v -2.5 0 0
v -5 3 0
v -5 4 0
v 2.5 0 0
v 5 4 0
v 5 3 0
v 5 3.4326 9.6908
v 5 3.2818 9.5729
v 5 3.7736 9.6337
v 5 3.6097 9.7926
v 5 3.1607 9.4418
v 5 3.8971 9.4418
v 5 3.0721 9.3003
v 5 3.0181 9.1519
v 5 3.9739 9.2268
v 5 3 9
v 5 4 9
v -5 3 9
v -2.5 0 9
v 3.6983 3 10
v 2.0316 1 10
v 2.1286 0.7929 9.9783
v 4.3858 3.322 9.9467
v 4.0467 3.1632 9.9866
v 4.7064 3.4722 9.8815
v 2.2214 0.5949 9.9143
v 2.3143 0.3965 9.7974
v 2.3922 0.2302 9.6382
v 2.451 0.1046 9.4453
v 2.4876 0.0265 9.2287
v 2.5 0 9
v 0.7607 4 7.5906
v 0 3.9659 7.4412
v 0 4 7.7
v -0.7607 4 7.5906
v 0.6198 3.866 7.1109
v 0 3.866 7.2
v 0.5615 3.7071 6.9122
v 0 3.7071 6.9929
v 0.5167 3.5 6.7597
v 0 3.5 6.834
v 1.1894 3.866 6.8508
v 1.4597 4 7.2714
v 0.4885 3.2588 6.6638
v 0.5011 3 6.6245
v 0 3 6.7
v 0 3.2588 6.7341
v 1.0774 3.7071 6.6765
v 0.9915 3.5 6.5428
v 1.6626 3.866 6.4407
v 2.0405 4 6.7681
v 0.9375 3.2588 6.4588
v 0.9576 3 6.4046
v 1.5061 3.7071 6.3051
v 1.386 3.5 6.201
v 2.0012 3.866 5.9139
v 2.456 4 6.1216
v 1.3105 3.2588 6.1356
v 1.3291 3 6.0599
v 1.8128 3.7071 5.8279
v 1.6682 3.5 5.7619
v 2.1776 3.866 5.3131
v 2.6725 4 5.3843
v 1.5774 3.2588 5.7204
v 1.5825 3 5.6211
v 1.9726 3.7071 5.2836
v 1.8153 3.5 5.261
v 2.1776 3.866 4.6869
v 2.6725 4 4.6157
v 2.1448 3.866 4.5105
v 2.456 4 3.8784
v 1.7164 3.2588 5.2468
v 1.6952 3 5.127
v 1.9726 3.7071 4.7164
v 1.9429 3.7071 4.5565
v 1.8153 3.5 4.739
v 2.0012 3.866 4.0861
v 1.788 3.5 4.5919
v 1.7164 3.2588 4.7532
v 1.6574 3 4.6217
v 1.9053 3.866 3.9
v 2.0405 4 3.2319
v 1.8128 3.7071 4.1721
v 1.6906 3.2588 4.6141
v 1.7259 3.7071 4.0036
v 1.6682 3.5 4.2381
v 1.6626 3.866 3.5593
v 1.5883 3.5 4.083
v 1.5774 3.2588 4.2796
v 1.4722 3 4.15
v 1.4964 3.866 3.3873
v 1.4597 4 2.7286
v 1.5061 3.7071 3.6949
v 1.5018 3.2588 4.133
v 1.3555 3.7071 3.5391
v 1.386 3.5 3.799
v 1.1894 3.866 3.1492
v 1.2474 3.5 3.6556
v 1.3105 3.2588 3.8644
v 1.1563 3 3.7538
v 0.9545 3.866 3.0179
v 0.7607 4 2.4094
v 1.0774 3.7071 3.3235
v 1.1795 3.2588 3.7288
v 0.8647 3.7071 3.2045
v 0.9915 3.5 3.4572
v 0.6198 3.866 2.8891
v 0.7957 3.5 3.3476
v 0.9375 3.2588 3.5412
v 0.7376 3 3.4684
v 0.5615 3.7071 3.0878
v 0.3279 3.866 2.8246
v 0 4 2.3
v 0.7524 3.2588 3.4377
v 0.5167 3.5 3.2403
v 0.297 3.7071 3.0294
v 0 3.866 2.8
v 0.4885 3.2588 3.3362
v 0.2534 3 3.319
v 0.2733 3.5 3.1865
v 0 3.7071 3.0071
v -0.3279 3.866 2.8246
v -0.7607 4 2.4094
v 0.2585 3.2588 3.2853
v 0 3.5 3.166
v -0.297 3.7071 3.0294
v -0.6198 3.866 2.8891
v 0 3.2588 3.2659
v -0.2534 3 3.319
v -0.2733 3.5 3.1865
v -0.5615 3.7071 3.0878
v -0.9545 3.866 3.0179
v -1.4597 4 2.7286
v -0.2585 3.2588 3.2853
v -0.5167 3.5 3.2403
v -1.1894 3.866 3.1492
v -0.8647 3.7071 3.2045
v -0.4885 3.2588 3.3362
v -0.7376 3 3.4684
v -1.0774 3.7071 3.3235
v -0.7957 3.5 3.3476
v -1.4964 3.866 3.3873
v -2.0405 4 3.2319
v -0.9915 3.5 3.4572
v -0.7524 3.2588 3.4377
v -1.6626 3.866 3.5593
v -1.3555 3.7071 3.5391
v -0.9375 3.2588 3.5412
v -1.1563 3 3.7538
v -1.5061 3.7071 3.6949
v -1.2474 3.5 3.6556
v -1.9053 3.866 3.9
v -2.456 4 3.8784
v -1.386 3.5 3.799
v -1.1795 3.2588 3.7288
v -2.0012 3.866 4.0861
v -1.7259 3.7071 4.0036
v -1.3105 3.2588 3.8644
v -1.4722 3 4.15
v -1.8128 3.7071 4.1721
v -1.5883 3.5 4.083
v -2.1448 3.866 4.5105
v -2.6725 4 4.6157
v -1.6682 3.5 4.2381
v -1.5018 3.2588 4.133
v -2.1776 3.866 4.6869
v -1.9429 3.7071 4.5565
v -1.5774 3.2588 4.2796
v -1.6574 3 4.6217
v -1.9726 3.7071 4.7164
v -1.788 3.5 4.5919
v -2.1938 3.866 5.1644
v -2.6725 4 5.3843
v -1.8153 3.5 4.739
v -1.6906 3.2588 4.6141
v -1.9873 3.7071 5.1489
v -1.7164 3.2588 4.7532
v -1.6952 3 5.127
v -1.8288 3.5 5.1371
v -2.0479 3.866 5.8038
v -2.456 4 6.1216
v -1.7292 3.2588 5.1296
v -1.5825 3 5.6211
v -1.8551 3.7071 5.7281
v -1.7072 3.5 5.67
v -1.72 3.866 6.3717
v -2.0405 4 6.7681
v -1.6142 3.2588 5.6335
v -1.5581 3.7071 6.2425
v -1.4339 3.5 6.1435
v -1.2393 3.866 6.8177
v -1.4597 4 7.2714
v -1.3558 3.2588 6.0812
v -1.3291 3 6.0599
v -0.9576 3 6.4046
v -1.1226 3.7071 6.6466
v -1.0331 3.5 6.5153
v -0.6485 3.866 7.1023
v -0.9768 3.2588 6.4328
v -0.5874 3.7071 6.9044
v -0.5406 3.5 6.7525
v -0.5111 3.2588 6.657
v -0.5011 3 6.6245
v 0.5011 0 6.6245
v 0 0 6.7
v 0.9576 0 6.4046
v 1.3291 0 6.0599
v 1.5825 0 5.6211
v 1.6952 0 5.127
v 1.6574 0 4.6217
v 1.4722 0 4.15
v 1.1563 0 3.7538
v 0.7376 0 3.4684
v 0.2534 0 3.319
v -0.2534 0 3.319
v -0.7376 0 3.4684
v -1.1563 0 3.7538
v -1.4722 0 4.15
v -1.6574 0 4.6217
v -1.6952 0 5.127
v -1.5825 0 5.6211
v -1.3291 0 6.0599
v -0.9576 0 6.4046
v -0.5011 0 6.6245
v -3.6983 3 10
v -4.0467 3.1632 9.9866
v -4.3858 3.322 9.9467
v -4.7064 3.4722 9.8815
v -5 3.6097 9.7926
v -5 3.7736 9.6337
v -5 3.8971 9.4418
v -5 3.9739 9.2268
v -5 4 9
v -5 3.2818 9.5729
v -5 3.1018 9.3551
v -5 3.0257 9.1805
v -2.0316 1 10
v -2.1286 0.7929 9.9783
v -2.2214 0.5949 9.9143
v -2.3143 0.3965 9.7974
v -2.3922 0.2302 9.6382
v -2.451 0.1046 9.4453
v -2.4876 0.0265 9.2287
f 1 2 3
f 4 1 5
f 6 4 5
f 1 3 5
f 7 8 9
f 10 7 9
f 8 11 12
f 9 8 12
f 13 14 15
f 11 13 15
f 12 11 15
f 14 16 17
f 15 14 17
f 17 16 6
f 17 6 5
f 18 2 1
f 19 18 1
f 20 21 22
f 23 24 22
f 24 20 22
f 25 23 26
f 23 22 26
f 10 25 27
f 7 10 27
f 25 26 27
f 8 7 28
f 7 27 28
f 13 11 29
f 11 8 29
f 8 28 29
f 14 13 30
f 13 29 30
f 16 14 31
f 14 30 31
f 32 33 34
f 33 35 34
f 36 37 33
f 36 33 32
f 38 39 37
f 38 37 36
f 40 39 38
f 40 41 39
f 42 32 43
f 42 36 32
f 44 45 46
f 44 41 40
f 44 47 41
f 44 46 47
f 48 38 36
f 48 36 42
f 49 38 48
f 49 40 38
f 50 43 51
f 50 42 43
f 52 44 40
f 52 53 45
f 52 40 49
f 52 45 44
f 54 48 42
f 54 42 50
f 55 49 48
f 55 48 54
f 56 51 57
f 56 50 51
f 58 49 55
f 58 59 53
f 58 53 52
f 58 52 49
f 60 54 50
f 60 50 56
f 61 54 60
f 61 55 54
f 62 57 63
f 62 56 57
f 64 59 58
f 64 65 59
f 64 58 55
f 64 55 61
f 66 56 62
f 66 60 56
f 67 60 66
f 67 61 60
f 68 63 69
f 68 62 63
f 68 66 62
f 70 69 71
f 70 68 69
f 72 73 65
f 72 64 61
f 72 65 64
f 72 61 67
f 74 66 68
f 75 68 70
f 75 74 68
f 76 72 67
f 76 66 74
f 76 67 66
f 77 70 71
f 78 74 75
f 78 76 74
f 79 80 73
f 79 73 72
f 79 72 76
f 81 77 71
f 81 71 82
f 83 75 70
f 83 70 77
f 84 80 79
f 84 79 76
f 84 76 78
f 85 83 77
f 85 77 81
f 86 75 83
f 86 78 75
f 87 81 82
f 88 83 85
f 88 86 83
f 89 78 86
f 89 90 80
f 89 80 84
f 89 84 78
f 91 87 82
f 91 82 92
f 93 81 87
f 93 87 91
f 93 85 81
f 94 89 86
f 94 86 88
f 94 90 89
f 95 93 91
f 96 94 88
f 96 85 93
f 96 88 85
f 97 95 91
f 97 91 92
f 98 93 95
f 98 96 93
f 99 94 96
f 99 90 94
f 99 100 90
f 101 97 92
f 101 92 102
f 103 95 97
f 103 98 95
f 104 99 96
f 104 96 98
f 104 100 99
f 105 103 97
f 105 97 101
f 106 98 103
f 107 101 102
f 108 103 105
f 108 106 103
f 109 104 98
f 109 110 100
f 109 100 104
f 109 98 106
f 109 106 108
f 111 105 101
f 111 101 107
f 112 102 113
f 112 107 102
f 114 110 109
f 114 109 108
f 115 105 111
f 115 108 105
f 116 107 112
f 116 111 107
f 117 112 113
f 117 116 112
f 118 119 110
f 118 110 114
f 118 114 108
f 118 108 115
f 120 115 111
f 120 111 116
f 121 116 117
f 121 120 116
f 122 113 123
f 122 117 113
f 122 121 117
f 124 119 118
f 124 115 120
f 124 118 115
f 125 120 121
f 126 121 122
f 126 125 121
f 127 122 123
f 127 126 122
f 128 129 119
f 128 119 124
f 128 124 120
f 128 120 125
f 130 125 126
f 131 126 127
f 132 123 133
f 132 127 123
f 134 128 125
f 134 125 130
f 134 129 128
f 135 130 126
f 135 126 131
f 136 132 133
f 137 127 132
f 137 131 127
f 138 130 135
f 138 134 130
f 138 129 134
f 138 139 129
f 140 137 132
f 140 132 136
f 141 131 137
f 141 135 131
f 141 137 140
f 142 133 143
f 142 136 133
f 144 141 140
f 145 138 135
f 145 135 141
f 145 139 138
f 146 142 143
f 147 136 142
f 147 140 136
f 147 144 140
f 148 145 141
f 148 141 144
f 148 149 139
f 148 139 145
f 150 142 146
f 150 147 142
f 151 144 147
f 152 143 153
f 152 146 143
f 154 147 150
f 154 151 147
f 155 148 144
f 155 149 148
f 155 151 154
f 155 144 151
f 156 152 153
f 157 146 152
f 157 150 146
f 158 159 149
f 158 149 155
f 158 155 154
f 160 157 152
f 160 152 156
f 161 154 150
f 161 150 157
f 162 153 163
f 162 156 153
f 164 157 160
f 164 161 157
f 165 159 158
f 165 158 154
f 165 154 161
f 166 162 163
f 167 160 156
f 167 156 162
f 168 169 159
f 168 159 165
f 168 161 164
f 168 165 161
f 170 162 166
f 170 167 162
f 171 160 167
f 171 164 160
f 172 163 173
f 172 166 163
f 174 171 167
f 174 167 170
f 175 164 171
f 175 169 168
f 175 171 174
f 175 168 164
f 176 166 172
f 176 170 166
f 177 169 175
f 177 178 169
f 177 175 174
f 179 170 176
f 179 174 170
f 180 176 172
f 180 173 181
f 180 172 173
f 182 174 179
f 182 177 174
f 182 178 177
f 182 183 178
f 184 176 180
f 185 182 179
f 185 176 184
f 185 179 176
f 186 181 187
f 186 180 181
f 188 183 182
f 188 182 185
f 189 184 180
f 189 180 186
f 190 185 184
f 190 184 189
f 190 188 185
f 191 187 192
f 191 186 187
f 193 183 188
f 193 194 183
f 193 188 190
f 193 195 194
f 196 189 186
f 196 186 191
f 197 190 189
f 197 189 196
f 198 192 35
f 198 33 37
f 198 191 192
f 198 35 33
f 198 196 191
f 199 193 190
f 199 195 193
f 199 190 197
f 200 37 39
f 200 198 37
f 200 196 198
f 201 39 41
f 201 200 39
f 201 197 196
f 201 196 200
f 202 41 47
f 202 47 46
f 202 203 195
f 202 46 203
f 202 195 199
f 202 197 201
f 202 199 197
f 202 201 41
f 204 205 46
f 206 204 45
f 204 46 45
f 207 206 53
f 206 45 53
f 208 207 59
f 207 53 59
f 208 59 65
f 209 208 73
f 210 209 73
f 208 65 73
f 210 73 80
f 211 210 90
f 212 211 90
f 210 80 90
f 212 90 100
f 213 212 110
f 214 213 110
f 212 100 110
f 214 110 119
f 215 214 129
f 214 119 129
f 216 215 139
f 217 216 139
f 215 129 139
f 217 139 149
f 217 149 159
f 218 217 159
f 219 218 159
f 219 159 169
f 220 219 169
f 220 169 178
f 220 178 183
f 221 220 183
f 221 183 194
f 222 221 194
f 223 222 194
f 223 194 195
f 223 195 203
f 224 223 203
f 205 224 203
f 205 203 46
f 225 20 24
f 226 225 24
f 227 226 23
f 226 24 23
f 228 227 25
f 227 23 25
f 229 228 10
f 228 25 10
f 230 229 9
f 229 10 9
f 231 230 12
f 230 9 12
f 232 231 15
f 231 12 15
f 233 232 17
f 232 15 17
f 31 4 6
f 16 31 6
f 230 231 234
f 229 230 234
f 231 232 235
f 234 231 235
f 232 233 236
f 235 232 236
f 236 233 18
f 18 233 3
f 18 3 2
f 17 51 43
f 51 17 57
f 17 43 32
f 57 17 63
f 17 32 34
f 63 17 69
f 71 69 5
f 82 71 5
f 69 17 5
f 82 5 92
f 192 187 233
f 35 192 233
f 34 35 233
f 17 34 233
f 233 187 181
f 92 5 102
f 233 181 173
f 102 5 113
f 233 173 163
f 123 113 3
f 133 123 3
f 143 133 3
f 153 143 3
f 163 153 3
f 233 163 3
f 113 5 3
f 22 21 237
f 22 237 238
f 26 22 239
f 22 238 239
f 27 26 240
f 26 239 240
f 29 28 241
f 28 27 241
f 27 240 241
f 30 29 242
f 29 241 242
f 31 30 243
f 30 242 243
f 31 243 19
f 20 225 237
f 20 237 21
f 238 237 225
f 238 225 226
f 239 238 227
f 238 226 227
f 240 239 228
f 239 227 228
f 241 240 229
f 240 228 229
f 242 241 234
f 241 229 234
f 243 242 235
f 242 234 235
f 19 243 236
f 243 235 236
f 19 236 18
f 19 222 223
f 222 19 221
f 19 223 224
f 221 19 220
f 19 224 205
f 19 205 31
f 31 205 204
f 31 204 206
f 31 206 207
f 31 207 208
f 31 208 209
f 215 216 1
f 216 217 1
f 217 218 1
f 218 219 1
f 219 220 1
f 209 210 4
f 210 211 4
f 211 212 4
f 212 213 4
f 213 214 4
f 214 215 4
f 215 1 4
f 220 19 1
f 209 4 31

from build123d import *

# Parameters (mm, degrees)
BOSS_EXTRUDE1_DEPTH = 10
SKETCH3_R           = 1.7
CUT_EXTRUDE1_DEPTH  = 12.874342087
FILLET2_R           = 1


with BuildPart() as part:
    # Sketch1 → Boss-Extrude1 (new body)
    with BuildSketch(Plane.XY):
        Polygon((-2.5, 0), (2.5, 0), (5, 3), (5, 4), (-5, 4), (-5, 3), align=None)
    extrude(amount=BOSS_EXTRUDE1_DEPTH)

    # Sketch3 → Cut-Extrude1 (cut, through all)
    with BuildSketch(Plane(origin=(0, 4, 0), x_dir=(1, 0, 0), z_dir=(0, 1, 0))):
        with Locations(Location((0, -5, 0), (0, 0, 270))):
            Circle(SKETCH3_R)
    extrude(amount=-CUT_EXTRUDE1_DEPTH, mode=Mode.SUBTRACT)

    # Fillet2
    # the kernel refuses this fillet: 1 mm, written as the material it takes off along each edge
    with BuildSketch(Plane(origin=(-5, 0, 10), x_dir=(0, 0, -1), z_dir=(1, 0, 0))) as fillet2_piece_1:
        with BuildLine():
            CenterArc((FILLET2_R, FILLET2_R), FILLET2_R, 180, 90)
            Line((0, FILLET2_R), (0, 0))
            Line((0, 0), (FILLET2_R, 0))
        make_face()
    extrude(amount=10, mode=Mode.SUBTRACT)
    with BuildSketch(Plane(origin=(0.899539001, -1.920553199, 10), x_dir=(-0.768221279597376, 0.6401843996644797, 0), z_dir=(0.6401843996644797, 0.768221279597376, 0))) as fillet2_piece_2:
        with BuildLine():
            CenterArc((FILLET2_R, -FILLET2_R), FILLET2_R, 90, 90)
            Line((0, -FILLET2_R), (0, 0))
            Line((0, 0), (FILLET2_R, 0))
        make_face()
    extrude(amount=8.905124838, mode=Mode.SUBTRACT)
    with BuildSketch(Plane(origin=(-6.600460999, 4.920553199, 10), x_dir=(0, 0, -1), z_dir=(0.6401843996644797, -0.768221279597376, 0))) as fillet2_piece_3:
        with BuildLine():
            CenterArc((FILLET2_R, FILLET2_R), FILLET2_R, 180, 90)
            Line((0, FILLET2_R), (0, 0))
            Line((0, 0), (FILLET2_R, 0))
        make_face()
    extrude(amount=8.905124838, mode=Mode.SUBTRACT)
    with BuildSketch(Plane(origin=(7.5, 4, 10), x_dir=(0, -1, 0), z_dir=(-1, 0, 0))) as fillet2_piece_4:
        with BuildLine():
            CenterArc((FILLET2_R, -FILLET2_R), FILLET2_R, 90, 90)
            Line((0, -FILLET2_R), (0, 0))
            Line((0, 0), (FILLET2_R, 0))
        make_face()
    extrude(amount=15, mode=Mode.SUBTRACT)
    with BuildSketch(Plane(origin=(0, 4, 5), x_dir=(0, 0, 1), z_dir=(-1, 0, 0))) as fillet2_piece_5:
        with BuildLine():
            CenterArc((1.7 + FILLET2_R, -FILLET2_R), FILLET2_R, 90, 90)
            Line((1.7 + FILLET2_R, 0), (1.7, 0))
            Line((1.7, 0), (1.7, -FILLET2_R))
        make_face()
    revolve(axis=Axis((0, 4, 5), (0, 1, 0)), mode=Mode.SUBTRACT)


solid = part.part
